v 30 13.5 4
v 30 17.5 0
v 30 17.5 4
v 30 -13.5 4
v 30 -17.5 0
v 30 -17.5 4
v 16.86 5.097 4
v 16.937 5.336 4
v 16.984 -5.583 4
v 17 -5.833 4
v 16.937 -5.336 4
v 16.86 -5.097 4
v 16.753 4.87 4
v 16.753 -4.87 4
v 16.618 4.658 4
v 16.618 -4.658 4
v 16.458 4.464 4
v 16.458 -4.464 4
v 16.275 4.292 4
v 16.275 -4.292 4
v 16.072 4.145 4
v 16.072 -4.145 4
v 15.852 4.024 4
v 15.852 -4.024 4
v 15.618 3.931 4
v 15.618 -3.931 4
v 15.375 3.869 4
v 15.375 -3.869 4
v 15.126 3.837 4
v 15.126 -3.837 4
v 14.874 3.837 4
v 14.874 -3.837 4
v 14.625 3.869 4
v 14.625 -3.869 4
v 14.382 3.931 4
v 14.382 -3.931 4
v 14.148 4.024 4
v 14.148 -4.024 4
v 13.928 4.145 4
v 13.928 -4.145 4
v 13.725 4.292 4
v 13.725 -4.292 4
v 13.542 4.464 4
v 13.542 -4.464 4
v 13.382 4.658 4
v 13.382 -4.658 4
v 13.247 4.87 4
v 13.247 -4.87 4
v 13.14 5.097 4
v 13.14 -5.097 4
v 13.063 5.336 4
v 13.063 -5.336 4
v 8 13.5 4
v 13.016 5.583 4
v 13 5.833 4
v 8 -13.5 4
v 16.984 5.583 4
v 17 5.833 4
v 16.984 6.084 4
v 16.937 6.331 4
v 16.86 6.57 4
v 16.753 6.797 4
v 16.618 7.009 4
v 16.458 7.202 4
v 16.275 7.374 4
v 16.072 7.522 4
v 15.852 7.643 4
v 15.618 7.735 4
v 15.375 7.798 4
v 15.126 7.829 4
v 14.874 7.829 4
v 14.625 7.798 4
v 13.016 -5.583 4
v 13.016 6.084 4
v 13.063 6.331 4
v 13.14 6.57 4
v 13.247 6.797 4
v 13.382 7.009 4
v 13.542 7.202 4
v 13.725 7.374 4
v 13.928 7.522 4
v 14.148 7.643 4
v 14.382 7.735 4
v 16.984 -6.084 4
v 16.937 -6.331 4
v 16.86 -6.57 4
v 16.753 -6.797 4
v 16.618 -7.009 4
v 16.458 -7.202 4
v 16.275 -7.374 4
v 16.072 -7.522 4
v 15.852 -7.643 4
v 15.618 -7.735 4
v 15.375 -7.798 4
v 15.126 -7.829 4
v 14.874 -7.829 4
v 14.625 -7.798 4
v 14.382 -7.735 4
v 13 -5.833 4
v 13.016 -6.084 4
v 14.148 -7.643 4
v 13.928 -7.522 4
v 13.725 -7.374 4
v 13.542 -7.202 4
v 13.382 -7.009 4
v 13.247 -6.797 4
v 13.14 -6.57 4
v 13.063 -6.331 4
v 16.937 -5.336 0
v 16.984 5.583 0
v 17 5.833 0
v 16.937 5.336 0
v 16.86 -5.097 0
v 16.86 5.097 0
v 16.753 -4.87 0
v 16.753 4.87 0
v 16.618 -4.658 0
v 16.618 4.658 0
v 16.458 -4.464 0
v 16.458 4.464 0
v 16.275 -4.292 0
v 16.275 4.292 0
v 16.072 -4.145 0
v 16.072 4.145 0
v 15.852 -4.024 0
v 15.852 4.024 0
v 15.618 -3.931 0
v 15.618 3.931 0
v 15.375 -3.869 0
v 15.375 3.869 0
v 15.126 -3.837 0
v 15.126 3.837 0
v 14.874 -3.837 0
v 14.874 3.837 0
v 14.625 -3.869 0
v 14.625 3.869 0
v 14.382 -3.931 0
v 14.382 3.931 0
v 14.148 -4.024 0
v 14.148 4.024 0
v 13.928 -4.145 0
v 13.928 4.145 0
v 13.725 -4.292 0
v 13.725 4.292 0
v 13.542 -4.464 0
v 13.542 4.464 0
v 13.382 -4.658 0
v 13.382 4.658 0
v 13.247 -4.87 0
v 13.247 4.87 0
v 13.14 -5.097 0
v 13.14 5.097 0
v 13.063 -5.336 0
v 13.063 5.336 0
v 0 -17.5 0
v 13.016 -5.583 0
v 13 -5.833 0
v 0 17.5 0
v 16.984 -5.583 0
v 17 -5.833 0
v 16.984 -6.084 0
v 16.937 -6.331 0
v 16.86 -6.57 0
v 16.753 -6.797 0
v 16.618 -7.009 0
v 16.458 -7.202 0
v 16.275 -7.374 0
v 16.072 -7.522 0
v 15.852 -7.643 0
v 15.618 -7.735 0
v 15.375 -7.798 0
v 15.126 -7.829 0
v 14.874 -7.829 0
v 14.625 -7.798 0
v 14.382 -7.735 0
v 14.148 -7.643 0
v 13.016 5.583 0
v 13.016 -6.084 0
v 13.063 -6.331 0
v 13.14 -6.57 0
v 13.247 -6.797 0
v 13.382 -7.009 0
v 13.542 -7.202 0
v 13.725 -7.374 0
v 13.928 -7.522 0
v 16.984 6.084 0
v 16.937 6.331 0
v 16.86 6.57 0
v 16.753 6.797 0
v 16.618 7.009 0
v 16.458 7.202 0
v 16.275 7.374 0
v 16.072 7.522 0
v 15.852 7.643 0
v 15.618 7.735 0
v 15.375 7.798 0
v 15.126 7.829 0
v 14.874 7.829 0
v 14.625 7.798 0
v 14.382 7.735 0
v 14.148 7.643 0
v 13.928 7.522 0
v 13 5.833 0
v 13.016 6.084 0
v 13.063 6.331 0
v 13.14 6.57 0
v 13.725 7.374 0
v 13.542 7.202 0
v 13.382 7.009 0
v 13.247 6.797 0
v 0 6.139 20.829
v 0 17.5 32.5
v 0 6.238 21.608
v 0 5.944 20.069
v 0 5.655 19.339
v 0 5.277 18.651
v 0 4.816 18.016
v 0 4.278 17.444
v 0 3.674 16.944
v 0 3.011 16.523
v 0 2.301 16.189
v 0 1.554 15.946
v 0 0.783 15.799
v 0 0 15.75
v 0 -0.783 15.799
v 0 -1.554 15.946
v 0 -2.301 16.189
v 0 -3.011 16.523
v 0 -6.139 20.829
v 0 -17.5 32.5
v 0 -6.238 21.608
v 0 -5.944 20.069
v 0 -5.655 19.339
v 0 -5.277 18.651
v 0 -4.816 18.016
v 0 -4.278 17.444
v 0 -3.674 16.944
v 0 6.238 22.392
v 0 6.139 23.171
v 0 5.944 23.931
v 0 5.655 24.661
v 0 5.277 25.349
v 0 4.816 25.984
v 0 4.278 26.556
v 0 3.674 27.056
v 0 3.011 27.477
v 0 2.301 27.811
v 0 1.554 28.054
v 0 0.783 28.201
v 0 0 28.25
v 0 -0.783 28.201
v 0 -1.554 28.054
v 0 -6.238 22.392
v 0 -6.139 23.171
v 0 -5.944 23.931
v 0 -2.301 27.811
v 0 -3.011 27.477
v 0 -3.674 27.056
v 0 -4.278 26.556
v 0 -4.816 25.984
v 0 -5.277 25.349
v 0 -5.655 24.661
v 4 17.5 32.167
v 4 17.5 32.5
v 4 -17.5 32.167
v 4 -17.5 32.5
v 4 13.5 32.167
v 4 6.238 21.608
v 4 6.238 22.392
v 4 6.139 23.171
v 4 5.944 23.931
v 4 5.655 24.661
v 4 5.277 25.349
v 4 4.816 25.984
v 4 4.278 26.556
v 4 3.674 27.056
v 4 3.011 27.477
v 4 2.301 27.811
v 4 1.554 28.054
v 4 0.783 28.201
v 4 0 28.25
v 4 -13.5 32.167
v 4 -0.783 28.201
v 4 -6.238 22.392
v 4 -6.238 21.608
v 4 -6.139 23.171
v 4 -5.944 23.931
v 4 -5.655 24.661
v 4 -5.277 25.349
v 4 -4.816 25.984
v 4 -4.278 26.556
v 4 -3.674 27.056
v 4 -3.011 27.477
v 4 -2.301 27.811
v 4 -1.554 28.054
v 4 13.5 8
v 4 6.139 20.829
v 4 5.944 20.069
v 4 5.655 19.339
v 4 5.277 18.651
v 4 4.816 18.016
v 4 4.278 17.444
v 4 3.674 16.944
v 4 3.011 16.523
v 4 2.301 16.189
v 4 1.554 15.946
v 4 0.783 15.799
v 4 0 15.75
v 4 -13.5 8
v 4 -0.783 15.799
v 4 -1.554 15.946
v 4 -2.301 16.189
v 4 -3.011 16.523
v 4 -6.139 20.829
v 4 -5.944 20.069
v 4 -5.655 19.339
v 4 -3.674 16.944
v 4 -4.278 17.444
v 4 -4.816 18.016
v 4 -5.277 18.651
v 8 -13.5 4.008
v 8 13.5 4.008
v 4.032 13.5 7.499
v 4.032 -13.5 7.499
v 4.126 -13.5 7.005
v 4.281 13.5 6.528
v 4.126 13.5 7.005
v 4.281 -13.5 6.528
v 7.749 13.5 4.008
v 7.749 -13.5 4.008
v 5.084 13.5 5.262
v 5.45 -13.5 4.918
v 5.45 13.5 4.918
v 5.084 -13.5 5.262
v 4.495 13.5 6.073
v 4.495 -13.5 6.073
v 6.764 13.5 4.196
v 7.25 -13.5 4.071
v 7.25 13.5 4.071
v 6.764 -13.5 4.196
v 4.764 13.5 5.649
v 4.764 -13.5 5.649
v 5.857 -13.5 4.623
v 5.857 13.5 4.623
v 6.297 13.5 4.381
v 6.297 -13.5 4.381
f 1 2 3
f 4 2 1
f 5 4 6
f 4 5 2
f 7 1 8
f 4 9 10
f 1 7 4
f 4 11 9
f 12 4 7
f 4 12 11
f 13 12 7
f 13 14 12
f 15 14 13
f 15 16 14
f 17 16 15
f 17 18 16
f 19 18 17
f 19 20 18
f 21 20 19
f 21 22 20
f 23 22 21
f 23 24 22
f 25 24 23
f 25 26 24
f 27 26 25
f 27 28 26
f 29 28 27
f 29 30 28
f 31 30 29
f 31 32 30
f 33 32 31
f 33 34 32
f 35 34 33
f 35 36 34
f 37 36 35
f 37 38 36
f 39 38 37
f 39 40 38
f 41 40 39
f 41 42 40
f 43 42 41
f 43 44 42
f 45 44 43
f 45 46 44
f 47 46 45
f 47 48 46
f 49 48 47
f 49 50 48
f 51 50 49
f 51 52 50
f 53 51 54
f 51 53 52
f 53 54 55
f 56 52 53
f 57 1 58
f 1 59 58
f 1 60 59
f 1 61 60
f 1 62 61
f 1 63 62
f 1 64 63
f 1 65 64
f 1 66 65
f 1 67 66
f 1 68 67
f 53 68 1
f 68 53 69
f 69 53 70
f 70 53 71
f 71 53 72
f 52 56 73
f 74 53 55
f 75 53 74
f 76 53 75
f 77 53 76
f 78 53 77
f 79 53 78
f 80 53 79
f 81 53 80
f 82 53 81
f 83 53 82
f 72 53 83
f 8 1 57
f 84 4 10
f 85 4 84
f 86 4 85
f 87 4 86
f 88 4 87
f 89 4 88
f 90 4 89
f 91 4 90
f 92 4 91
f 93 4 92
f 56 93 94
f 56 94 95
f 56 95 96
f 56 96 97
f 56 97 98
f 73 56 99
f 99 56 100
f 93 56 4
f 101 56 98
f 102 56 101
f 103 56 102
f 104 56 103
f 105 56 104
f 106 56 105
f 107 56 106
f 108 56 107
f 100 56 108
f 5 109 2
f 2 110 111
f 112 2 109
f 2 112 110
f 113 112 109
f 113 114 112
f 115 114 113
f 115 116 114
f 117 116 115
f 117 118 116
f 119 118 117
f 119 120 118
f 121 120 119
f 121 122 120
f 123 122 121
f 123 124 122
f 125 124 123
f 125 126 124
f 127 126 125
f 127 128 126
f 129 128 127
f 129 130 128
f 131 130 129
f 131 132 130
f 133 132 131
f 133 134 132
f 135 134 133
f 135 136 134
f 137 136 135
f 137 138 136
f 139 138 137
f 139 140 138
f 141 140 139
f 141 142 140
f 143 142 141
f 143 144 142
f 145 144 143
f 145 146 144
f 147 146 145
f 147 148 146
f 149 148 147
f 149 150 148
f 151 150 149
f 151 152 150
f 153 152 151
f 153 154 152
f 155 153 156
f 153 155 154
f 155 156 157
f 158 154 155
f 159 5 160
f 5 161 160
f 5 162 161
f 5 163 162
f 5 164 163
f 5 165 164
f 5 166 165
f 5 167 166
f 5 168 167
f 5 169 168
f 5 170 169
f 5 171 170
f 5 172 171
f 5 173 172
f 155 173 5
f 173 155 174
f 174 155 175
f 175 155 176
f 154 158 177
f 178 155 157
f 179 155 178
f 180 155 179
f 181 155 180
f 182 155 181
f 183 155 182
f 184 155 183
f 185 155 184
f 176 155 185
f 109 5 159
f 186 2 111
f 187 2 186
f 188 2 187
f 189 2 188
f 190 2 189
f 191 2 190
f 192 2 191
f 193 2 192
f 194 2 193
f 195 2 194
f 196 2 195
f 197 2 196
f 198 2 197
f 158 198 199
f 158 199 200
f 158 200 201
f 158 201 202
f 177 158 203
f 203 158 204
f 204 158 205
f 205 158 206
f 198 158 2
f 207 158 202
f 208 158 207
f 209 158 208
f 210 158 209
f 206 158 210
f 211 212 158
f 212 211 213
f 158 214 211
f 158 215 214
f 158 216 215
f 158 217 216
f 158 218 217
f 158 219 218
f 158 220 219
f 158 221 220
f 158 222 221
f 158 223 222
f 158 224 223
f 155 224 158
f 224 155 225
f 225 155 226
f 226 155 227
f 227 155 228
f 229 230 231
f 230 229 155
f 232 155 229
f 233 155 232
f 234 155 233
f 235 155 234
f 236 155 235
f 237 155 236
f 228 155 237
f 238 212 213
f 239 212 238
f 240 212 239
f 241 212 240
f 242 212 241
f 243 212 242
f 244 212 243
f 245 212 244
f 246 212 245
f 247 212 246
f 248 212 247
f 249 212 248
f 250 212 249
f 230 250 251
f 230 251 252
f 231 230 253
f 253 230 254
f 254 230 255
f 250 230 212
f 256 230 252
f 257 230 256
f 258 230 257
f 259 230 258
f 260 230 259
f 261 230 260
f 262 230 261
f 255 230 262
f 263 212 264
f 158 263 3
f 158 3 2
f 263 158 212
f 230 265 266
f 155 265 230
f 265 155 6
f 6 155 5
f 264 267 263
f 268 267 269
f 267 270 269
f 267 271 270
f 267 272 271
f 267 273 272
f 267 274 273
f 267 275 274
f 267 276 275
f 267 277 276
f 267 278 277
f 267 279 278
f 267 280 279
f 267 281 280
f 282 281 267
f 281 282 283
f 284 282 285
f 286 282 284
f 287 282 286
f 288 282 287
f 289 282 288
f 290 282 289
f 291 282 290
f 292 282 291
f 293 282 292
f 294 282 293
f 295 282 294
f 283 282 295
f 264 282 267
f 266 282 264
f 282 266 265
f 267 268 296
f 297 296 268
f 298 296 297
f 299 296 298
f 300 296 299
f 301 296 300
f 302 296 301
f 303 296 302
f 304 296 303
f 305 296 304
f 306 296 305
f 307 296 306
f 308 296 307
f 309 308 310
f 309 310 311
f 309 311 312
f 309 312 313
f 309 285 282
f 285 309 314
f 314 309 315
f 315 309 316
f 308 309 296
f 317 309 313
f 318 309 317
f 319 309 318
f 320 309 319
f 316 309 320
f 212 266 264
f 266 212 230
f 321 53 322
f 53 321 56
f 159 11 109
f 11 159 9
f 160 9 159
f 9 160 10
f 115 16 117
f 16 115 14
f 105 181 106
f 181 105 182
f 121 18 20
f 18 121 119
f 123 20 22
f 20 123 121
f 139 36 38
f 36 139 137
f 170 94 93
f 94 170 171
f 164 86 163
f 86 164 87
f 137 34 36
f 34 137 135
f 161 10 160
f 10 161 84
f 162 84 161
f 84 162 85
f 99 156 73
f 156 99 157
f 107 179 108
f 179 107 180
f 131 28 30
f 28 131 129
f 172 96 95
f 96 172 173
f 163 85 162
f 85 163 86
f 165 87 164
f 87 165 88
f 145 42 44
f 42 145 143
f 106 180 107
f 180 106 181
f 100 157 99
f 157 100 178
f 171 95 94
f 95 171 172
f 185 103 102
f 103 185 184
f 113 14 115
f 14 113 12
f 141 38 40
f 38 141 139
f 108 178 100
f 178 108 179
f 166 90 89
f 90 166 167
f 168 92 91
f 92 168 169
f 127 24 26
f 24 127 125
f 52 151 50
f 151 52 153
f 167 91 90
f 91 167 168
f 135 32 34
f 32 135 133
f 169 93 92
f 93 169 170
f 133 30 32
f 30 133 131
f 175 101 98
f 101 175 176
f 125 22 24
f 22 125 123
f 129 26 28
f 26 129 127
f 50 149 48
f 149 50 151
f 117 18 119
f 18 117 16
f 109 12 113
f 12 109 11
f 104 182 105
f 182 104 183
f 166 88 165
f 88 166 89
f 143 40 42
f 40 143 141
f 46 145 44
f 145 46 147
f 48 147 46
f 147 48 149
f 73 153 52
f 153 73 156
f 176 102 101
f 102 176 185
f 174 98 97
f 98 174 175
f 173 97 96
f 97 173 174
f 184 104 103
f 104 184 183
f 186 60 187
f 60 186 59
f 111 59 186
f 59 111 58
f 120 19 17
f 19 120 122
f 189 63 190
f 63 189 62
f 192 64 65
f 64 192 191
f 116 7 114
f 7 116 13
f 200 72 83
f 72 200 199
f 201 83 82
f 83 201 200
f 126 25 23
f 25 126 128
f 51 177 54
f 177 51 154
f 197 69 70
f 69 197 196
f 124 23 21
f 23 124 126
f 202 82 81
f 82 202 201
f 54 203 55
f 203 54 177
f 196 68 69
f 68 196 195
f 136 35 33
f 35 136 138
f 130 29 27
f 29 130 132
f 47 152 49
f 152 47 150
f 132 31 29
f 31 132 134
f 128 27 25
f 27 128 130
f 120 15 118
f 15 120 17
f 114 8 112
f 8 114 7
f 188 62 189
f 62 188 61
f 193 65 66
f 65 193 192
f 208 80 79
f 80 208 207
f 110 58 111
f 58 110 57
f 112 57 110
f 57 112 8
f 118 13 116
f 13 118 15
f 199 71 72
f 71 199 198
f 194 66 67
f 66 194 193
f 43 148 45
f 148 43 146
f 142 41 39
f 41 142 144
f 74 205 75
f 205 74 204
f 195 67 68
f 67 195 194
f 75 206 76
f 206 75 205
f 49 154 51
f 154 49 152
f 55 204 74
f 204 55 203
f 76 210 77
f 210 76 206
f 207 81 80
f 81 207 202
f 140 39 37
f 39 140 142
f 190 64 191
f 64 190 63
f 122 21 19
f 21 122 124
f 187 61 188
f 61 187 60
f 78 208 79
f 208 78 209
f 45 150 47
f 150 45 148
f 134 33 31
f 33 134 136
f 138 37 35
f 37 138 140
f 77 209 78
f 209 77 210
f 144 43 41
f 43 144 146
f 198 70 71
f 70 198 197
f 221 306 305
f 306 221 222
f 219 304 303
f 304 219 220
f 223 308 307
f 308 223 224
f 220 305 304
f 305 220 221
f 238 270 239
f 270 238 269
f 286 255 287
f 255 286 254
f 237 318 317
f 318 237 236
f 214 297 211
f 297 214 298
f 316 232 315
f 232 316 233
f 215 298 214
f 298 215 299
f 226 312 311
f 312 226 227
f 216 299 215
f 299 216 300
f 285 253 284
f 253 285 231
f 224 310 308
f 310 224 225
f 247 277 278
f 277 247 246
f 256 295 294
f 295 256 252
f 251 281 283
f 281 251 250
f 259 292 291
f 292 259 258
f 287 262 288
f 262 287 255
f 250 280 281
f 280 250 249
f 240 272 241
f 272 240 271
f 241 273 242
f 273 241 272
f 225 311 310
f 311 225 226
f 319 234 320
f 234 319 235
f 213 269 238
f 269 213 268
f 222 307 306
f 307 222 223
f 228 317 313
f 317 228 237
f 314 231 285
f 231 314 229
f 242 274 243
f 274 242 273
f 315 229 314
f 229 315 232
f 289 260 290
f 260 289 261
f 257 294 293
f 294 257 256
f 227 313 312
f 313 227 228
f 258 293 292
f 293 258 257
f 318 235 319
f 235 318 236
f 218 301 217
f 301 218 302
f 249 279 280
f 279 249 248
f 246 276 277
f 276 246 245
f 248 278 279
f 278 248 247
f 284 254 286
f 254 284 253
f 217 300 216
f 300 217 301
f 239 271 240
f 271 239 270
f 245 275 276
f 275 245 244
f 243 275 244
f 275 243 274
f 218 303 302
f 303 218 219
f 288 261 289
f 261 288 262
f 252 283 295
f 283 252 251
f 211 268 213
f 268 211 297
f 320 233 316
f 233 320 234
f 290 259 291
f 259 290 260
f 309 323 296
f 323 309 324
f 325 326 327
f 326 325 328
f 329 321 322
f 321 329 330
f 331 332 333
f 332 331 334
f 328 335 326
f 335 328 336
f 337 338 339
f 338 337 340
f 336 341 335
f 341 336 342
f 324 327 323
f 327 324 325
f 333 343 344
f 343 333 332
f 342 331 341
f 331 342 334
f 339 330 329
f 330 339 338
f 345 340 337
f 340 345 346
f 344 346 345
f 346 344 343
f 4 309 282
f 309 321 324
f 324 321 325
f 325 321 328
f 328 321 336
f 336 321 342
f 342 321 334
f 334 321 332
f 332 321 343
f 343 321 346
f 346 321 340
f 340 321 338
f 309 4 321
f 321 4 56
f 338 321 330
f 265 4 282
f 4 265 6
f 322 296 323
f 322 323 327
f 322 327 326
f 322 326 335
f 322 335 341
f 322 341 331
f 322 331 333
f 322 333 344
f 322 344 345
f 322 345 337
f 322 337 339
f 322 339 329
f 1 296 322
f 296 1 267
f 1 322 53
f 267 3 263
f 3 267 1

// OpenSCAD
heightToHoleCenter = 22;//mm //EDITED
potHoleWidth = 7; 

screwD =4;//screw //measured: ~3.5mm

totalHeight = heightToHoleCenter+(potHoleWidth/2)+5 + 2;//+x makes cutout deeper
totalWidth = 25+ 10;
totalLength = 30;
thickness = 4;
curveRes = 50;

module potBracket(){
    bracket(braces=true, holeDiam=7, sideMount=true,notch=true);
}

module boltBracket(){
    bracket(holeDiam = 6.5,braces=true,notch=false);
}

module bracket(holeDiam = 7, braces=false, sideMount=false, notch = false){  
    //totalHeight = heightToHoleCenter+(10.5 - (holeDiam / 2)); //what was I thinking here?
    
    //for side-mounted screw-holes:
    sideExtension = 10;//how far to extend out
    sideLength = thickness * 2 + screwD;
    sideWidth  =  totalWidth + sideExtension * 2;
    //sideWidth  =  totalWidth + thickness * 4 + screwD * 2;
    sideHeight = thickness - 1;
    
    minkowOffset = 3; //also means edge curve radius
    
    difference() {
        //two halves & joint curve fill-in
        union(){
            cube([totalLength,totalWidth,thickness]);
            cube([thickness,totalWidth, totalHeight]);
            cube([thickness * 2, totalWidth, thickness * 2]);
            //sidemount cube
            if(sideMount){
                
                translate([minkowOffset,-1*(sideExtension),1])
                
                minkowski(){
                    cube([sideLength, sideWidth, sideHeight - 1]);
                    cylinder(h=2, r=minkowOffset, center=true, $fn=curveRes);
                }
            }
            
        }
        
        //potentiometer hole
        translate([thickness, totalWidth / 2, heightToHoleCenter])
        rotate([0,90,0])
        #cylinder(h=thickness * 2, d=holeDiam, center=true, $fn=curveRes);
        
        //notch at top
        if(notch){
            translate([0,(totalWidth / 2) -1,heightToHoleCenter + (holeDiam/2) + 4])
            #cube([thickness, 2, totalHeight]);
        }
        //curve @ joint
        
        translate([thickness * 2,totalWidth/2, thickness * 2])
        rotate([90,0,0])
        cylinder(h=totalWidth, r=thickness, center=true, $fn=curveRes);
        
        //2 screw holes
        if(sideMount){
            translate([(sideLength / 2) + minkowOffset, 0 , thickness / 2]){
                translate([0,-1 * (sideExtension / 2),0])
                    #screw();
                
                translate([0,totalWidth + (sideExtension / 2),0])
                    #screw();
            }
            
        } else {        
            translate([totalLength / 2, 0, thickness / 2]){
                translate([0, totalWidth / 3, 0])
                #screw();
                translate([0, 2 *(totalWidth / 3), 0])
                #screw();
            }
        }
        
        //slice off the top
        translate([0,0,totalHeight])
        #cube([thickness * 2, totalWidth, thickness]);
    }
    if(braces){
        translate([0, 0, thickness]){
            brace();
            translate([0,totalWidth - thickness, 0])
            brace();
        }
    }
        
}

module brace(){
    crossLength = sqrt(pow(totalHeight, 2) + pow(totalLength,2));
    angle = asin(totalHeight/crossLength);
    d = (sin(angle) * totalLength)  - totalHeight / 2;
    
    difference(){
        
        intersection(){
            //base cube
            translate([thickness, 0, 0])
            cube([totalLength - thickness,thickness, totalHeight]);
            
            //angled cube
            rotate([0,angle,0])
            translate([0,0,d])
            cube(center=true,[crossLength * 1.2, thickness * 2, totalHeight]);
        }
        
        //cube for clipping the top:
        translate([0,0, totalHeight - thickness])
        cube([totalLength, thickness, thickness]);
    }
    
}

module screw(){
    translate([0,0,thickness / 2])
    cylinder(h=thickness * 2, d=screwD, center=true, $fn=curveRes);
}
//translate([thickness*0, 0, thickness])
//brace();
translate([0, -1 * (totalWidth / 2), 0])
//potBracket();
bracket(braces=true, holeDiam=12.5);
//screw();
//boltBracket();
